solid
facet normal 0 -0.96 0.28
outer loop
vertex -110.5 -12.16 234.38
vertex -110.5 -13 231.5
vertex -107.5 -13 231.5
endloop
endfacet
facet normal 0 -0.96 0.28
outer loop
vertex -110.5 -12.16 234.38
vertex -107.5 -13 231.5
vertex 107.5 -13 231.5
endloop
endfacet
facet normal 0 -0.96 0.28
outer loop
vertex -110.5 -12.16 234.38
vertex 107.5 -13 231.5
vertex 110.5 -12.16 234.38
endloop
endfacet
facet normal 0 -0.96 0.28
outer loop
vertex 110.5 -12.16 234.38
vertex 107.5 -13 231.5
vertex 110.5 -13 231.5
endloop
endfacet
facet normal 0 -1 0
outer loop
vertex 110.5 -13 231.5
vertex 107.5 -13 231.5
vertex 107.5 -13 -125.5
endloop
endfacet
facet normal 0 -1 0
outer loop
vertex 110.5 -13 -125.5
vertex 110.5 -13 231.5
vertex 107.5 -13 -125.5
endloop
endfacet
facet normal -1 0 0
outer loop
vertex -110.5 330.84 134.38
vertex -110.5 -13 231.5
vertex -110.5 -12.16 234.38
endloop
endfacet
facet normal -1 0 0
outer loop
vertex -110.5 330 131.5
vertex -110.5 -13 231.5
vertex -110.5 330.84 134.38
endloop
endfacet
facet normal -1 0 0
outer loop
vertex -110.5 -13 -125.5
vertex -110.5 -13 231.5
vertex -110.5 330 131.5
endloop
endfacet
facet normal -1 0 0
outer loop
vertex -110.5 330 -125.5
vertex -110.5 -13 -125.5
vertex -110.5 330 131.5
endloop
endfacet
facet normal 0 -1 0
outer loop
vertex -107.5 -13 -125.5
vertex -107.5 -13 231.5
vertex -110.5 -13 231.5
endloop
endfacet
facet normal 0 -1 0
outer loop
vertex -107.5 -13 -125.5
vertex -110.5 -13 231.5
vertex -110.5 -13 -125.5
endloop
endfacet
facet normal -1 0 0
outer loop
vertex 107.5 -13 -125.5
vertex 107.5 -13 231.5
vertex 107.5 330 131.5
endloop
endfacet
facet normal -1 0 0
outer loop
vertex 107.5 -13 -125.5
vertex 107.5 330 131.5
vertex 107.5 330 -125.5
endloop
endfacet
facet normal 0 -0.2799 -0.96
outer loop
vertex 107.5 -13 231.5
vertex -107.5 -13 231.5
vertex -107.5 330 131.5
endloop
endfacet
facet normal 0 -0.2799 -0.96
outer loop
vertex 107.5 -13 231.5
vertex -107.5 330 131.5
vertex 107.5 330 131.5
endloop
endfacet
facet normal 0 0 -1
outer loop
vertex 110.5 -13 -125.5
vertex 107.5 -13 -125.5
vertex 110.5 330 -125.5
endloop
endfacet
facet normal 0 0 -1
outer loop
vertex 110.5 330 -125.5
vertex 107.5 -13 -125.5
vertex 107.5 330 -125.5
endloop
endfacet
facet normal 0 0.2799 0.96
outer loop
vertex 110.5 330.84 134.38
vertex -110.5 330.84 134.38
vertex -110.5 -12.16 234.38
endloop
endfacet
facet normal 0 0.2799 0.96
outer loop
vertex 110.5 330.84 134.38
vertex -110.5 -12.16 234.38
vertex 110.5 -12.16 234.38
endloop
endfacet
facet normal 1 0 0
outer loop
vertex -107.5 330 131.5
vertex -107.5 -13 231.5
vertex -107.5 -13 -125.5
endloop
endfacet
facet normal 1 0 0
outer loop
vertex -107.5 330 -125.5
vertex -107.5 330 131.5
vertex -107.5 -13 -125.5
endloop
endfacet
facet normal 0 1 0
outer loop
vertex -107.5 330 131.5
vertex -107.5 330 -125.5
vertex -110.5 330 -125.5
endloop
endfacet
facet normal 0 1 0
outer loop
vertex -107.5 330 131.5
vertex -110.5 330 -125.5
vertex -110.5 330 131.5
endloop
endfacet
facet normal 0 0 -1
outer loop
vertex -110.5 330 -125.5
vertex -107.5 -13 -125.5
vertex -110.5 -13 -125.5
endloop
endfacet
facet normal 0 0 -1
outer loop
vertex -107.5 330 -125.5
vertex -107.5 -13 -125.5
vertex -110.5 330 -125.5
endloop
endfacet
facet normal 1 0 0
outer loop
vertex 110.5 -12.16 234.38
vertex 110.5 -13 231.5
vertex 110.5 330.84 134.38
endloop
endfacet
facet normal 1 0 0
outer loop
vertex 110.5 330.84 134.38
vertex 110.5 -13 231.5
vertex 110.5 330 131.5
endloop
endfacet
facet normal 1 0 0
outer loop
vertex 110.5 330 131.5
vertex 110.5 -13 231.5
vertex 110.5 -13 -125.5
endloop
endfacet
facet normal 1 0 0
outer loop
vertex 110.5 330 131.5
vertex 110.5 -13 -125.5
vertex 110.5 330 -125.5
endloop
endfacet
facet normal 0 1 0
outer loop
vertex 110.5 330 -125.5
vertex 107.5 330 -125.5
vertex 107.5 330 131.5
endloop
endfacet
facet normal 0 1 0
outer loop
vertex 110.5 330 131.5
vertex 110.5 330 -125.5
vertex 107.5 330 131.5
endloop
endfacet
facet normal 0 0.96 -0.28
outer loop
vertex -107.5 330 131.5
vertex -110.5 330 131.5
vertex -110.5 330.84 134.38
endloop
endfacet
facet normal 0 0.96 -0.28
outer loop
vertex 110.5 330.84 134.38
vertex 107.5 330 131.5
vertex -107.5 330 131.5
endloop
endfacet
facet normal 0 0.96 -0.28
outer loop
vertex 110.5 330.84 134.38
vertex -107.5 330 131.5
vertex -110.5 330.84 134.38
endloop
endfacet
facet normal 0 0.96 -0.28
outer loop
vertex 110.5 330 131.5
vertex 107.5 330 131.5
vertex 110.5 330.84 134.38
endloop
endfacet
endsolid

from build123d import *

# Parameters (mm, degrees)
BOSS_EXTRUDE1_DEPTH = 3
SKETCH2_W           = 221
SKETCH2_H           = 357.28000224
BOSS_EXTRUDE2_DEPTH = 3


with BuildPart() as part:
    # Sketch1 → Boss-Extrude1 (new body)
    with BuildSketch(Plane(origin=(107.5, 0, 0), x_dir=(0, 0, -1), z_dir=(1, 0, 0))):
        Polygon((125.5, 330), (-131.5, 330), (-231.5, -13), (125.5, -13), align=None)
    extrude(amount=BOSS_EXTRUDE1_DEPTH)


with BuildPart() as body_2:
    # Mirror2: mirrored copy
    add(part.part.mirror(Plane(origin=(0, 0, 0), x_dir=(0, 0, 1), z_dir=(1, 0, 0))))


with BuildPart() as part_1:
    add(part.part)

    add(body_2.part)  # Boss-Extrude2 merges body 2
    # Sketch2 → Boss-Extrude2 (add)
    with BuildSketch(Plane(origin=(0, 61.18692665, 209.871158411), x_dir=(1, 0, 0), z_dir=(0, 0.27989252, 0.960031342))):
        with Locations((0, 101.364475406)):
            Rectangle(SKETCH2_W, SKETCH2_H)
    extrude(amount=BOSS_EXTRUDE2_DEPTH)


solid = part_1.part
